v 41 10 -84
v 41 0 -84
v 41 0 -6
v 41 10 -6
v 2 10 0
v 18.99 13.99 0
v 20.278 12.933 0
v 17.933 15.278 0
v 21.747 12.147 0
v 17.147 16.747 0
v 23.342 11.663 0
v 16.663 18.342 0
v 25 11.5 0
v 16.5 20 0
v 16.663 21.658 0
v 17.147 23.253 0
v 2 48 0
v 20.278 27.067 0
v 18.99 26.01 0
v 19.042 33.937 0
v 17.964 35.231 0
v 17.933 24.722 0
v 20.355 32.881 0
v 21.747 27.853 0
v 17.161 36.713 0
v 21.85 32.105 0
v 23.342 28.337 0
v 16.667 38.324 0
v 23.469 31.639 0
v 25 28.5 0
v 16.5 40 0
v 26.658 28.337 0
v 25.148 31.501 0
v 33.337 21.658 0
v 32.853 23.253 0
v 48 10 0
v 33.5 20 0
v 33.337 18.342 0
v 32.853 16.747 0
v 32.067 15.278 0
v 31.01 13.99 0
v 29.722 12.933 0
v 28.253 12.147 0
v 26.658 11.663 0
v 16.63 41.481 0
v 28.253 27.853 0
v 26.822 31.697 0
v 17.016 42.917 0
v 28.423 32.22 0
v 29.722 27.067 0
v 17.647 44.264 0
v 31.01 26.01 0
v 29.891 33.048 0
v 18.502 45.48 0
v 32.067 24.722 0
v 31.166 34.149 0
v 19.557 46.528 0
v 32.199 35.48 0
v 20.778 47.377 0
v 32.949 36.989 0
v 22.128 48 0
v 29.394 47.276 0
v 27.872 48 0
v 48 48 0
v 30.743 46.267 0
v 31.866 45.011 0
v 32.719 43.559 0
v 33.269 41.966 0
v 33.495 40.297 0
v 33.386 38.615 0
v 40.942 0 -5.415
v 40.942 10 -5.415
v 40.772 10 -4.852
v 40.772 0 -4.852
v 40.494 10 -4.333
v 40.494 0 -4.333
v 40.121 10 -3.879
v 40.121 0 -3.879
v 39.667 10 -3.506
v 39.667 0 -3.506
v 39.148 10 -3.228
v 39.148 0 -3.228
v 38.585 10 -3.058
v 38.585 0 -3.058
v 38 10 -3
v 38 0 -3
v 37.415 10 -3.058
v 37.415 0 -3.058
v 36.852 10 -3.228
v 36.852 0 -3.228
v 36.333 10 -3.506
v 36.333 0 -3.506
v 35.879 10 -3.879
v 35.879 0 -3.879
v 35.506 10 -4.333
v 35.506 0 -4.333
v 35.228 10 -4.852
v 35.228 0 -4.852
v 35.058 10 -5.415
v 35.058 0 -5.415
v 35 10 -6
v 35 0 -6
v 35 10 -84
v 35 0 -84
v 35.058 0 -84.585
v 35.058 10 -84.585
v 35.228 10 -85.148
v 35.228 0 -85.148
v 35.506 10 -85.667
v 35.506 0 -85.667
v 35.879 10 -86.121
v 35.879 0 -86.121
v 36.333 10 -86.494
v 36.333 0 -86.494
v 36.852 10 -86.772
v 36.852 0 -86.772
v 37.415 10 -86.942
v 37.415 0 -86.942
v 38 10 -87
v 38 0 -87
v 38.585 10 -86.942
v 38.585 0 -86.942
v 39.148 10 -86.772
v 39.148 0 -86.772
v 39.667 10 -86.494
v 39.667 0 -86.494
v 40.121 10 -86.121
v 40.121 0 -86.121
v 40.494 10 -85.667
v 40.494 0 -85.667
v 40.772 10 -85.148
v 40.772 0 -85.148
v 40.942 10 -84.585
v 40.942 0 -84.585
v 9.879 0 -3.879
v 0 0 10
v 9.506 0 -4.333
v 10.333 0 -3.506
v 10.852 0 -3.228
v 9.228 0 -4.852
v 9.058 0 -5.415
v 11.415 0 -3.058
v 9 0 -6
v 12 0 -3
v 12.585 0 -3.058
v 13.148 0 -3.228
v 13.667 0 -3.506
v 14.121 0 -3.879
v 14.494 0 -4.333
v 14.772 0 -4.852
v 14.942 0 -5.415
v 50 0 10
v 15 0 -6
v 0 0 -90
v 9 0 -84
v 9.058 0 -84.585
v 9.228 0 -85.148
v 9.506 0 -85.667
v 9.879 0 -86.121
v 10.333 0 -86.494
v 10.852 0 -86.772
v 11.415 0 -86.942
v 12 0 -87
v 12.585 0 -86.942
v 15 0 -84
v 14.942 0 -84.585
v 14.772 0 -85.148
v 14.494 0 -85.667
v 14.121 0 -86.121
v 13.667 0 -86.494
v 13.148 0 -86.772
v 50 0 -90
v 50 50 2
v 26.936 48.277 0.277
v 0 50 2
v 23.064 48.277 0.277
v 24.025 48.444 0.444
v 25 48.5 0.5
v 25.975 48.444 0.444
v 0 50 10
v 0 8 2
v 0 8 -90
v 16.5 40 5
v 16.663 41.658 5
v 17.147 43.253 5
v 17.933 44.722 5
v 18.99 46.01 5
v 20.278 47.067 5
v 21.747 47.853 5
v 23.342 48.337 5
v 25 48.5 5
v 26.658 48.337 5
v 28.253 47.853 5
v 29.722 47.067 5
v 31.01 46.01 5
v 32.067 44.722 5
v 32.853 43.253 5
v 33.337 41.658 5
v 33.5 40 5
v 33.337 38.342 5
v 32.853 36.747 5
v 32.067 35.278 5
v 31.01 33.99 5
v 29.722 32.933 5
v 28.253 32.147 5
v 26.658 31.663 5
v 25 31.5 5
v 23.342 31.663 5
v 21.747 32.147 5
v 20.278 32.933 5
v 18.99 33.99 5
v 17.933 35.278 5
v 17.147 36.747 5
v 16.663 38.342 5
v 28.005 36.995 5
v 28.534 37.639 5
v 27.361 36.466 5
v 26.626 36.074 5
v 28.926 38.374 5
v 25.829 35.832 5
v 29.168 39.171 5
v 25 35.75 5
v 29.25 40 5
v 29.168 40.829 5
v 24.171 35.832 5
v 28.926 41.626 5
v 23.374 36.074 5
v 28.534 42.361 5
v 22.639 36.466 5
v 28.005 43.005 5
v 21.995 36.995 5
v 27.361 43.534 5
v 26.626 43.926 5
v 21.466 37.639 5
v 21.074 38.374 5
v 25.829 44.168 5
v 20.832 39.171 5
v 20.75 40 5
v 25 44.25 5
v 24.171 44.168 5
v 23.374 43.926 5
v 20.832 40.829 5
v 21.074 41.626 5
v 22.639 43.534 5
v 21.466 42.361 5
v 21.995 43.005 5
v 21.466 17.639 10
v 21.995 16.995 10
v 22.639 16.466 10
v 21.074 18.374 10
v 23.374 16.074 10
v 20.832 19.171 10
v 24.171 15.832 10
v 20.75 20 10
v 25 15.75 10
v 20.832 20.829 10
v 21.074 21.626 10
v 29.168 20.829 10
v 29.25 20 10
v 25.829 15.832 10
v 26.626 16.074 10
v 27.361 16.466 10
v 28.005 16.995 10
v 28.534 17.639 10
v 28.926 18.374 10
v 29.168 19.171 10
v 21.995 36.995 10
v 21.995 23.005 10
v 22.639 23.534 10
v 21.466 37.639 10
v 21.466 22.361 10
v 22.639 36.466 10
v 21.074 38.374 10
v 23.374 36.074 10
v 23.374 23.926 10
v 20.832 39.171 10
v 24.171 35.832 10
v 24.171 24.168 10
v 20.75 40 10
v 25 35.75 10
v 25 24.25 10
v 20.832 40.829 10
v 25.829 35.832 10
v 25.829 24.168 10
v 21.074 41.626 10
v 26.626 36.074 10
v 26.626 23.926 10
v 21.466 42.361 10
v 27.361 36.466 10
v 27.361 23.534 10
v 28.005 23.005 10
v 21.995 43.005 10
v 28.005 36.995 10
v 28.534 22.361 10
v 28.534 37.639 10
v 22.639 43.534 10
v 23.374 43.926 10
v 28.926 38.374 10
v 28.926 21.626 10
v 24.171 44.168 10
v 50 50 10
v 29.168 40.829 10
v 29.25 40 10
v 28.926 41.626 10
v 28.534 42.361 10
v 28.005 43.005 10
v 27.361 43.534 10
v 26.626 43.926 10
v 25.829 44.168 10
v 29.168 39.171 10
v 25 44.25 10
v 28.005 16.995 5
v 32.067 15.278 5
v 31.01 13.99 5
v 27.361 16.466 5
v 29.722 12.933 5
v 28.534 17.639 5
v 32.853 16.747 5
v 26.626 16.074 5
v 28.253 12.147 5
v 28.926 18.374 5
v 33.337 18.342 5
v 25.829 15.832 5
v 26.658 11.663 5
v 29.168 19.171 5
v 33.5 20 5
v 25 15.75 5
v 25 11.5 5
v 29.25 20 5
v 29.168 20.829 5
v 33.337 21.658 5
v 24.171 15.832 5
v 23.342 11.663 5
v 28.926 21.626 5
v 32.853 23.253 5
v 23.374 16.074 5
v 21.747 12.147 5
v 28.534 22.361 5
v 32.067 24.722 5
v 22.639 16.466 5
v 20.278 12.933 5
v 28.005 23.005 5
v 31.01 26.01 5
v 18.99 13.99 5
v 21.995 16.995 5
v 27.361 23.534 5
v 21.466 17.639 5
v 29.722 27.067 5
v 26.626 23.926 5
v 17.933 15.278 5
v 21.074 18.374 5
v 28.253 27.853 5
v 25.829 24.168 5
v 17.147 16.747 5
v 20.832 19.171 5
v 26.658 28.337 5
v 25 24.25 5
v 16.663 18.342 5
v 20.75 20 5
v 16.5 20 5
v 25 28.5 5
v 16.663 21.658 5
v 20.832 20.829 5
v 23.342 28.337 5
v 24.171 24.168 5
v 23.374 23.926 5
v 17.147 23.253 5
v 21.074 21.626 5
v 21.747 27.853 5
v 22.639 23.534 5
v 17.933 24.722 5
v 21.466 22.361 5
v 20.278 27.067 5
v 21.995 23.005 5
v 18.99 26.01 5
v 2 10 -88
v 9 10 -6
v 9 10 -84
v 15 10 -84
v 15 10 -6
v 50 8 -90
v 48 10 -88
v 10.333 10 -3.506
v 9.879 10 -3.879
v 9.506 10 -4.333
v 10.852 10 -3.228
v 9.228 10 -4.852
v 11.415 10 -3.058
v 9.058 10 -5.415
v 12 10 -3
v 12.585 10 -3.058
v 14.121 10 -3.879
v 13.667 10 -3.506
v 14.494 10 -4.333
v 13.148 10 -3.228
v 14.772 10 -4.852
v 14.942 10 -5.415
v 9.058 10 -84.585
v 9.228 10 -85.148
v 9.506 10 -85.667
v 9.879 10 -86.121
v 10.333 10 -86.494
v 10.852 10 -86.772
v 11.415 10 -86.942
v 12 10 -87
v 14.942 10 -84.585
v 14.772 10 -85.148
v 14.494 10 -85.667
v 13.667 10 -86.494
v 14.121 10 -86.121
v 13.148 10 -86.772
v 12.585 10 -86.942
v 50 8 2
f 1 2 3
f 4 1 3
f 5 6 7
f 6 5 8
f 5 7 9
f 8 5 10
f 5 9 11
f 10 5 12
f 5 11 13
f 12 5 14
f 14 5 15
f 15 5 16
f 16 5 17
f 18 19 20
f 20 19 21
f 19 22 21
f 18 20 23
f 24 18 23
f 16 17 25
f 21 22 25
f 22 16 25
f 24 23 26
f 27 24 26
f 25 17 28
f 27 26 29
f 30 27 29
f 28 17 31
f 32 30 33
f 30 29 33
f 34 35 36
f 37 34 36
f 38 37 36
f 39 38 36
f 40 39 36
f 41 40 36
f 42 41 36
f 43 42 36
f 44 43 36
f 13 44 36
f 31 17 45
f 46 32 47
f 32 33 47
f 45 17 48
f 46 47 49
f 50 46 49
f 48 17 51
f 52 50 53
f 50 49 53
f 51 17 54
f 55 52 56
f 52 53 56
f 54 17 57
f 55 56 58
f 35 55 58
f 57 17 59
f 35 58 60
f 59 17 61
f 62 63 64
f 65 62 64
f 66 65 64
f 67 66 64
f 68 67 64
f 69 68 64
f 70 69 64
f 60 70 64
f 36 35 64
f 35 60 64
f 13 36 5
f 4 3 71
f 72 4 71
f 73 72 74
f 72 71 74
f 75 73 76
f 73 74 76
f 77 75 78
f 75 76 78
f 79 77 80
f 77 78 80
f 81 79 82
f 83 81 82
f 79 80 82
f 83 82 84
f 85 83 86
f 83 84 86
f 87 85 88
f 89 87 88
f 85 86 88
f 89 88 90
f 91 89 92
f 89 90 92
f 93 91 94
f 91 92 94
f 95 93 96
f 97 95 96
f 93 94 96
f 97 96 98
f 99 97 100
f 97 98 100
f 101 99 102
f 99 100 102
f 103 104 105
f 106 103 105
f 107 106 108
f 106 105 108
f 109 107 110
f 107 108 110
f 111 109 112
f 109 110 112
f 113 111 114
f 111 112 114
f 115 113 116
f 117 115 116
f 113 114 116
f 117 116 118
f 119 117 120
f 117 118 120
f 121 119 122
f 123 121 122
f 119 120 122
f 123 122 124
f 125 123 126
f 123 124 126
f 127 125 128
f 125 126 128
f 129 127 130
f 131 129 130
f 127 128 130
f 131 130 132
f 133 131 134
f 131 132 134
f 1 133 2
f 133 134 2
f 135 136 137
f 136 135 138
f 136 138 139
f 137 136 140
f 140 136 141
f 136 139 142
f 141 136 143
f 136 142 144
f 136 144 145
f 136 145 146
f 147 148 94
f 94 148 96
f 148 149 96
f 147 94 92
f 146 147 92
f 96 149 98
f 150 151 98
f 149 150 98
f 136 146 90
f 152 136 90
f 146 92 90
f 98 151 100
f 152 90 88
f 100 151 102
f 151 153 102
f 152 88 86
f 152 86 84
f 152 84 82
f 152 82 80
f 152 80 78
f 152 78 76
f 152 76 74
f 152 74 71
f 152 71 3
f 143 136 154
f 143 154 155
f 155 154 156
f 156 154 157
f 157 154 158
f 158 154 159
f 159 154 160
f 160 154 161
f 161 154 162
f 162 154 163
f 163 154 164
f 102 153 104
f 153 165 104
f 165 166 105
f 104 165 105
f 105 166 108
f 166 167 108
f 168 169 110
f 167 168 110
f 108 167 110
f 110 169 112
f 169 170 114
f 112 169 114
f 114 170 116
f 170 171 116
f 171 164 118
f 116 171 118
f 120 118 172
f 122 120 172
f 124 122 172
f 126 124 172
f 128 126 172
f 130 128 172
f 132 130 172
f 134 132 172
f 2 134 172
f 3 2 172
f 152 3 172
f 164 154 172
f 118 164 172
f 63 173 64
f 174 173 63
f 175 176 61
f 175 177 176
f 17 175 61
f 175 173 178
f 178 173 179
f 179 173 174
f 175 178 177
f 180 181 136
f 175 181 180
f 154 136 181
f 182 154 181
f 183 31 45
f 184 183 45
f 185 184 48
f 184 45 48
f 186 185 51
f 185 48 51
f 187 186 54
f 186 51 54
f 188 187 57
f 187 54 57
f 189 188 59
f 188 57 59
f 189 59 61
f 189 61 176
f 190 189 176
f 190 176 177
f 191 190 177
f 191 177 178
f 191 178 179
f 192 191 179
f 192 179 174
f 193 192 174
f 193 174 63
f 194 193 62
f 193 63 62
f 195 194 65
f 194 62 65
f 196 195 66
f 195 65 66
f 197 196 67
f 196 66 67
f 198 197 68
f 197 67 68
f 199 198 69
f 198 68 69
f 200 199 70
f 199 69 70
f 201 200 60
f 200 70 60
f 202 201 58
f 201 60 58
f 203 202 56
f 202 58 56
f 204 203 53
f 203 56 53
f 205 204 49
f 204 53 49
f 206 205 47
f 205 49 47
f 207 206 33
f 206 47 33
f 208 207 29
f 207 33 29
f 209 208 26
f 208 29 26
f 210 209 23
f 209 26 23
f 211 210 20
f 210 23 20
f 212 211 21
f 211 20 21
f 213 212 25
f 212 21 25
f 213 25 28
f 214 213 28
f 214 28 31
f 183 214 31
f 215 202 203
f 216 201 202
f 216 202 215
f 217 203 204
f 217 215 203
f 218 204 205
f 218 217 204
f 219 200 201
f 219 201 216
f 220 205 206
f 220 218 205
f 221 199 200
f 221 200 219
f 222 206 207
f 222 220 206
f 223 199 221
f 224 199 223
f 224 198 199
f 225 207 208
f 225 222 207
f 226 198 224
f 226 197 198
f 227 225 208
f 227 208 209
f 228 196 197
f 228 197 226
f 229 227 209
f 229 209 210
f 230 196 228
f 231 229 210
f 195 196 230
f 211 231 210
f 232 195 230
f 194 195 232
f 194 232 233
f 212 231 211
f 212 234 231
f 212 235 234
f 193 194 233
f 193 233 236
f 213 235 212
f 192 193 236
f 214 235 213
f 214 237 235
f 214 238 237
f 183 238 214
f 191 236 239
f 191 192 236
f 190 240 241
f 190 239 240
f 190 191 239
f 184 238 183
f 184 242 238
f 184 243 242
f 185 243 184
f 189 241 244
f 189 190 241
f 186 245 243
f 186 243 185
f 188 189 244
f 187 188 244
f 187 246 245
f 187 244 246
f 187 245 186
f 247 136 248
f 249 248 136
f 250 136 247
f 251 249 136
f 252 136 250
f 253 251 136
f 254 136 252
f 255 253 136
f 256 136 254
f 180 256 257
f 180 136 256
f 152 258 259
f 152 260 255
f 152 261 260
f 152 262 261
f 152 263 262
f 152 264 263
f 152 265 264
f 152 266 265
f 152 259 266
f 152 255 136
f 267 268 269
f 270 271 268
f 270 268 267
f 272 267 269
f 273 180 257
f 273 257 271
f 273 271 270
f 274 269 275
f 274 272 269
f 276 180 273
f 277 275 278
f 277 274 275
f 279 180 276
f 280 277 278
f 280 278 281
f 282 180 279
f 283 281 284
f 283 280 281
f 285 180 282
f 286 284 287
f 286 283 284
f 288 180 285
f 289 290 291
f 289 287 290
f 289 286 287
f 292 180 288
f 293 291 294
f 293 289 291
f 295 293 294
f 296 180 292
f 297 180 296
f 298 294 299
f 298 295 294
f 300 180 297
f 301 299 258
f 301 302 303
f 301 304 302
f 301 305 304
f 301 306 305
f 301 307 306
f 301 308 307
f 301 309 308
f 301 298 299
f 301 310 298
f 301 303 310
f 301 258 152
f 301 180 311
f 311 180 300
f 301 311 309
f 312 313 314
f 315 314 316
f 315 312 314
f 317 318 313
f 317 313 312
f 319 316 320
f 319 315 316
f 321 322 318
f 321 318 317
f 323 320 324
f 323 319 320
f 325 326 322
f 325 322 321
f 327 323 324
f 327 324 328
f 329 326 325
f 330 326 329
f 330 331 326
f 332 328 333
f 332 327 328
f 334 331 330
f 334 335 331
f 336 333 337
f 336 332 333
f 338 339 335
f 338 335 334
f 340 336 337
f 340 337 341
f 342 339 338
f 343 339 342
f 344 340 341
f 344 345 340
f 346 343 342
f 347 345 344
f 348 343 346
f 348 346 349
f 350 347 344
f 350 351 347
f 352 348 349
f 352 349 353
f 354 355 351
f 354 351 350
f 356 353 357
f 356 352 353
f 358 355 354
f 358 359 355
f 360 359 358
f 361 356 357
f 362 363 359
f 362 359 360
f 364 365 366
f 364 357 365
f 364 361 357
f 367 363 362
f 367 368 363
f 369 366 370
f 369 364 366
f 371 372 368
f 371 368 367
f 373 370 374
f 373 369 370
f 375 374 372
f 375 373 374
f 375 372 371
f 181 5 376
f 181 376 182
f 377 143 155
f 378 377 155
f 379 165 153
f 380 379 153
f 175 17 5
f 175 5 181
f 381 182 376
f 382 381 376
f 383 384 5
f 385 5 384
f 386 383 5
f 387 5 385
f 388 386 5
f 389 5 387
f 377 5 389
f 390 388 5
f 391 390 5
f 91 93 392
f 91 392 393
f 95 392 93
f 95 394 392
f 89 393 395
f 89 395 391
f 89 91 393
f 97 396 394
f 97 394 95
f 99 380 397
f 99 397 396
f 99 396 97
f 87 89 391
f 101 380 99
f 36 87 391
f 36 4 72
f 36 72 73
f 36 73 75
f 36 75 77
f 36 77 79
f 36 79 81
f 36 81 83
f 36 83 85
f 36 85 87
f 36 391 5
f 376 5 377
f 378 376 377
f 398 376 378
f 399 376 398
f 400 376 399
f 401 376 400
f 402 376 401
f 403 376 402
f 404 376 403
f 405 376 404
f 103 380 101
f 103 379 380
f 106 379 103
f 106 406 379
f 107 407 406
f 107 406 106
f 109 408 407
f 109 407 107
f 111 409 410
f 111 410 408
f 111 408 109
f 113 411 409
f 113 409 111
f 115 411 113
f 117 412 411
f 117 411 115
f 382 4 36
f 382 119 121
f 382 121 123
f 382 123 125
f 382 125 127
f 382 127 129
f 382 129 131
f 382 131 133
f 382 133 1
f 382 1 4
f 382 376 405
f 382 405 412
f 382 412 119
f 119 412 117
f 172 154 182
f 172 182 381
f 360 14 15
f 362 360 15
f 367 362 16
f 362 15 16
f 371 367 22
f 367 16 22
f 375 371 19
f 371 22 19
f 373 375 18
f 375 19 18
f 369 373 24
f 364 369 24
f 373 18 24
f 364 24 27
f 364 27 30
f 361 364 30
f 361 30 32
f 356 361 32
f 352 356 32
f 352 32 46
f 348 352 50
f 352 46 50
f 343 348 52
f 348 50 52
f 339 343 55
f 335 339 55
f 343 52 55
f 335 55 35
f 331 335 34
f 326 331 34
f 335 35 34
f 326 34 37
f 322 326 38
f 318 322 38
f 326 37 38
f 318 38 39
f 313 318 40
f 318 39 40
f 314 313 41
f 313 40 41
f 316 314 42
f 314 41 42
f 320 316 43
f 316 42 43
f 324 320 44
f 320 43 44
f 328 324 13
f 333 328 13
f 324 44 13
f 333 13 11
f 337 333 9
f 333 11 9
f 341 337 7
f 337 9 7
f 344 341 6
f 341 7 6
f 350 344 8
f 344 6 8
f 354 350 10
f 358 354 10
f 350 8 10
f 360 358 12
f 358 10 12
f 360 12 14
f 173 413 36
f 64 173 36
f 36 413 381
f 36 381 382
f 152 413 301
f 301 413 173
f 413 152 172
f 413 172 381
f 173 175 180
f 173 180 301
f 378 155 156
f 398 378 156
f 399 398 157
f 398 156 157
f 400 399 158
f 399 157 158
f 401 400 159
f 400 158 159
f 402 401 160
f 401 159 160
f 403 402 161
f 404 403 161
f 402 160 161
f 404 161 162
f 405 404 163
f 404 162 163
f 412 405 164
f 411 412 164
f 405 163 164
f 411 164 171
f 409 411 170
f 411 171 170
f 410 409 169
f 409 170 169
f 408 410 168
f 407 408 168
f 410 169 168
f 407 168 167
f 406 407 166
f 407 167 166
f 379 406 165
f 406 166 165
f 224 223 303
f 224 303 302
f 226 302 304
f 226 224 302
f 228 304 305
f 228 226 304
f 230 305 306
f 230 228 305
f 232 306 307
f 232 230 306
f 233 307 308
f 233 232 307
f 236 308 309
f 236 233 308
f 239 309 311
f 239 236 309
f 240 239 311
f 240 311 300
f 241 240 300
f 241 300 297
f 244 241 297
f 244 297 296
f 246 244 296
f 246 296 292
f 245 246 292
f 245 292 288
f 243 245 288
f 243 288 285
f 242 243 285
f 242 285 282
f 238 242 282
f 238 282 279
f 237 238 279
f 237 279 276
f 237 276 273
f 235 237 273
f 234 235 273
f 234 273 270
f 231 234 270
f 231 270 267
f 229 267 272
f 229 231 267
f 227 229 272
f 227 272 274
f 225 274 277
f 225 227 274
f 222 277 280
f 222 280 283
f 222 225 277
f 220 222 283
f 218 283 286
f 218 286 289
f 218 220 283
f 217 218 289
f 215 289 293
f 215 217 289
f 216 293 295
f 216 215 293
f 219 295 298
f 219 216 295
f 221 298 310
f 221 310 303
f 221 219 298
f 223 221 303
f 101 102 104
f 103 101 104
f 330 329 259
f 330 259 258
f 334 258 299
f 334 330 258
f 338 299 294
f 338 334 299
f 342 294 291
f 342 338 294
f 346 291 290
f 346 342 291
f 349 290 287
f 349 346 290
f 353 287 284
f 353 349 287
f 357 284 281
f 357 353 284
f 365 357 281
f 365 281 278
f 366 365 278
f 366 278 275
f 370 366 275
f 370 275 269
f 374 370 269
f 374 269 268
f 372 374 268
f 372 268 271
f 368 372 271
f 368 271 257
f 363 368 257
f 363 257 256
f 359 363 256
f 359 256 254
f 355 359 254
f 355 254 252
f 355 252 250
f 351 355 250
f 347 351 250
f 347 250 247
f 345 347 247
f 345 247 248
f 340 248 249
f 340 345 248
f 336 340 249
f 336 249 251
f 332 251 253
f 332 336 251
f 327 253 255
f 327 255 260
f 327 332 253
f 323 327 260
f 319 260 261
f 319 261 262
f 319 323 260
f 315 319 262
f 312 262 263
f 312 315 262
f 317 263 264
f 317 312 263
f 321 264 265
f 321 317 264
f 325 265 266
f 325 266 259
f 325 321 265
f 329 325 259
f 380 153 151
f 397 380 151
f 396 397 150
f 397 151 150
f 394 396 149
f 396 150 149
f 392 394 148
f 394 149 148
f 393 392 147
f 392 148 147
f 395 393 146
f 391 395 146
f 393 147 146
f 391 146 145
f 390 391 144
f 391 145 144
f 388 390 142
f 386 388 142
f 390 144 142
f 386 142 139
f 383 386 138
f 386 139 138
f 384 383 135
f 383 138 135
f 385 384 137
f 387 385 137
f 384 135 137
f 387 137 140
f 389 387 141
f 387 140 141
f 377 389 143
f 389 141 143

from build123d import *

# Parameters (mm, degrees)
SKETCH1_W           = 50
SKETCH1_H           = 90
BOSS_EXTRUDE1_DEPTH = 10
SKETCH2_W           = 50
SKETCH2_H           = 50
SKETCH2_R           = 4.25
BOSS_EXTRUDE2_DEPTH = 10
SKETCH3_R           = 8.5
CUT_EXTRUDE1_DEPTH  = 5
CHAMFER1_SIZE       = 2


with BuildPart() as part:
    # Sketch1 → Boss-Extrude1 (new body)
    with BuildSketch(Plane(origin=(0, 0, 0), x_dir=(1, 0, 0), z_dir=(0, 1, 0))):
        with Locations((25, 45)):
            Rectangle(SKETCH1_W, SKETCH1_H)
        with BuildLine():
            Line((9, 6), (9, 84))
            ThreePointArc((9, 84), (12, 87), (15, 84))
            Line((15, 84), (15, 6))
            ThreePointArc((15, 6), (12, 3), (9, 6))
        make_face(mode=Mode.SUBTRACT)
        with BuildLine():
            Line((35, 6), (35, 84))
            ThreePointArc((35, 84), (38, 87), (41, 84))
            Line((41, 84), (41, 6))
            ThreePointArc((41, 6), (38, 3), (35, 6))
        make_face(mode=Mode.SUBTRACT)
    extrude(amount=BOSS_EXTRUDE1_DEPTH)

    # Sketch2 → Boss-Extrude2 (add)
    with BuildSketch(Plane.XY):
        with Locations((25, 25)):
            Rectangle(SKETCH2_W, SKETCH2_H)
        with Locations((25, 40)):
            Circle(SKETCH2_R, mode=Mode.SUBTRACT)
        with Locations((25, 20)):
            Circle(SKETCH2_R, mode=Mode.SUBTRACT)
    extrude(amount=BOSS_EXTRUDE2_DEPTH)

    # Sketch3 → Cut-Extrude1 (cut)
    with BuildSketch(Plane(origin=(0, 0, 0), x_dir=(-1, 0, 0), z_dir=(0, 0, -1))):
        with Locations((-25, 40)):
            Circle(SKETCH3_R)
        with Locations((-25, 20)):
            Circle(SKETCH3_R)
    extrude(amount=-CUT_EXTRUDE1_DEPTH, mode=Mode.SUBTRACT)

    # Chamfer1
    # the kernel refuses this chamfer: 2 mm, written as the material it takes off along each edge
    with BuildSketch(Plane(origin=(50, 10, 0), x_dir=(0.027495876610585623, -0.9996219169112968, 0), z_dir=(0, 0, -1))) as chamfer1_piece_1:
        Polygon((CHAMFER1_SIZE * 0.999621916911, CHAMFER1_SIZE * 0.0274958766106), (-CHAMFER1_SIZE * 0.0274958766106, CHAMFER1_SIZE * 0.999621916911), (0, 0), align=None)
    extrude(amount=95.143365976, mode=Mode.SUBTRACT)
    with BuildSketch(Plane(origin=(55.143365976, 10, -90), x_dir=(0, -0.9996219169112968, -0.027495876610589075), z_dir=(-1, 0, 0)), Plane(origin=(-5.143365976, 50, 0), x_dir=(0, 0.02749587661058563, 0.9996219169112968), z_dir=(1, 0, 0))) as chamfer1_piece_2:
        Polygon((CHAMFER1_SIZE * 0.999621916911, CHAMFER1_SIZE * 0.0274958766106), (-CHAMFER1_SIZE * 0.0274958766106, CHAMFER1_SIZE * 0.999621916911), (0, 0), align=None)
    extrude(amount=60.286731952, mode=Mode.SUBTRACT)
    with BuildSketch(Plane(origin=(50, 55.143365976, 0), x_dir=(0.02749587661058563, 0, 0.9996219169112968), z_dir=(0, -1, 0))) as chamfer1_piece_3:
        Polygon((CHAMFER1_SIZE * 0.999621916911, CHAMFER1_SIZE * 0.0274958766106), (-CHAMFER1_SIZE * 0.0274958766106, CHAMFER1_SIZE * 0.999621916911), (0, 0), align=None)
    extrude(amount=45.143365976, mode=Mode.SUBTRACT)
    with BuildSketch(Plane(origin=(0, 10, 0), x_dir=(0.9996219169112968, 0, -0.027495876610586372), z_dir=(0, 1, 0))) as chamfer1_piece_4:
        Polygon((CHAMFER1_SIZE * 0.999621916911, -CHAMFER1_SIZE * 0.0274958766106), (-CHAMFER1_SIZE * 0.0274958766106, -CHAMFER1_SIZE * 0.999621916911), (0, 0), align=None)
    extrude(amount=45.143365976, mode=Mode.SUBTRACT)
    with BuildSketch(Plane(origin=(0, 10, -95.143365976), x_dir=(0.9996219169112968, 0.027495876610586494, 0), z_dir=(0, 0, 1))) as chamfer1_piece_5:
        Polygon((CHAMFER1_SIZE * 0.999621916911, -CHAMFER1_SIZE * 0.0274958766106), (-CHAMFER1_SIZE * 0.0274958766106, -CHAMFER1_SIZE * 0.999621916911), (0, 0), align=None)
    extrude(amount=95.143365976, mode=Mode.SUBTRACT)
    with BuildSketch(Plane(origin=(50, 55.143365976, 0), x_dir=(0.02749587661058563, 0, 0.9996219169112968), z_dir=(0, -1, 0))) as chamfer1_piece_6a_section:
        Polygon((CHAMFER1_SIZE * 0.999621916911, CHAMFER1_SIZE * 0.0274958766106), (-CHAMFER1_SIZE * 0.0274958766106, CHAMFER1_SIZE * 0.999621916911), (0, 0), align=None)
    chamfer1_piece_6a = extrude(amount=50.286731952, mode=Mode.PRIVATE)
    chamfer1_piece_6a = split(chamfer1_piece_6a, bisect_by=Plane(origin=(49.340412746, 10, 0.659587254), z_dir=(0, -1, 0)), keep=Keep.TOP, mode=Mode.PRIVATE)
    with BuildSketch(Plane(origin=(50, 10, 5.143365976), x_dir=(0.027495876610585623, -0.9996219169112968, 0), z_dir=(0, 0, -1))) as chamfer1_piece_6b_section:
        Polygon((CHAMFER1_SIZE * 0.999621916911, CHAMFER1_SIZE * 0.0274958766106), (-CHAMFER1_SIZE * 0.0274958766106, CHAMFER1_SIZE * 0.999621916911), (0, 0), align=None)
    chamfer1_piece_6b = extrude(amount=100.286731952, mode=Mode.PRIVATE)
    chamfer1_piece_6b = split(chamfer1_piece_6b, bisect_by=Plane(origin=(49.340412746, 9.340412746, 0), z_dir=(0, 0, 1)), keep=Keep.TOP, mode=Mode.PRIVATE)
    chamfer1_piece_6 = chamfer1_piece_6a & chamfer1_piece_6b
    add(chamfer1_piece_6, mode=Mode.SUBTRACT)
    with BuildSketch(Plane(origin=(0, 4.856634024, 0), x_dir=(0.9996219169112968, 0, -0.027495876610586372), z_dir=(0, 1, 0))) as chamfer1_piece_7a_section:
        Polygon((CHAMFER1_SIZE * 0.999621916911, -CHAMFER1_SIZE * 0.0274958766106), (-CHAMFER1_SIZE * 0.0274958766106, -CHAMFER1_SIZE * 0.999621916911), (0, 0), align=None)
    chamfer1_piece_7a = extrude(amount=50.286731952, mode=Mode.PRIVATE)
    chamfer1_piece_7a = split(chamfer1_piece_7a, bisect_by=Plane(origin=(0.659587254, 10, 0.659587254), z_dir=(0, -1, 0)), keep=Keep.TOP, mode=Mode.PRIVATE)
    with BuildSketch(Plane(origin=(0, 10, -95.143365976), x_dir=(0.9996219169112968, 0.027495876610586494, 0), z_dir=(0, 0, 1))) as chamfer1_piece_7b_section:
        Polygon((CHAMFER1_SIZE * 0.999621916911, -CHAMFER1_SIZE * 0.0274958766106), (-CHAMFER1_SIZE * 0.0274958766106, -CHAMFER1_SIZE * 0.999621916911), (0, 0), align=None)
    chamfer1_piece_7b = extrude(amount=100.286731952, mode=Mode.PRIVATE)
    chamfer1_piece_7b = split(chamfer1_piece_7b, bisect_by=Plane(origin=(0.659587254, 9.340412746, 0), z_dir=(0, 0, 1)), keep=Keep.TOP, mode=Mode.PRIVATE)
    chamfer1_piece_7 = chamfer1_piece_7a & chamfer1_piece_7b
    add(chamfer1_piece_7, mode=Mode.SUBTRACT)


solid = part.part
